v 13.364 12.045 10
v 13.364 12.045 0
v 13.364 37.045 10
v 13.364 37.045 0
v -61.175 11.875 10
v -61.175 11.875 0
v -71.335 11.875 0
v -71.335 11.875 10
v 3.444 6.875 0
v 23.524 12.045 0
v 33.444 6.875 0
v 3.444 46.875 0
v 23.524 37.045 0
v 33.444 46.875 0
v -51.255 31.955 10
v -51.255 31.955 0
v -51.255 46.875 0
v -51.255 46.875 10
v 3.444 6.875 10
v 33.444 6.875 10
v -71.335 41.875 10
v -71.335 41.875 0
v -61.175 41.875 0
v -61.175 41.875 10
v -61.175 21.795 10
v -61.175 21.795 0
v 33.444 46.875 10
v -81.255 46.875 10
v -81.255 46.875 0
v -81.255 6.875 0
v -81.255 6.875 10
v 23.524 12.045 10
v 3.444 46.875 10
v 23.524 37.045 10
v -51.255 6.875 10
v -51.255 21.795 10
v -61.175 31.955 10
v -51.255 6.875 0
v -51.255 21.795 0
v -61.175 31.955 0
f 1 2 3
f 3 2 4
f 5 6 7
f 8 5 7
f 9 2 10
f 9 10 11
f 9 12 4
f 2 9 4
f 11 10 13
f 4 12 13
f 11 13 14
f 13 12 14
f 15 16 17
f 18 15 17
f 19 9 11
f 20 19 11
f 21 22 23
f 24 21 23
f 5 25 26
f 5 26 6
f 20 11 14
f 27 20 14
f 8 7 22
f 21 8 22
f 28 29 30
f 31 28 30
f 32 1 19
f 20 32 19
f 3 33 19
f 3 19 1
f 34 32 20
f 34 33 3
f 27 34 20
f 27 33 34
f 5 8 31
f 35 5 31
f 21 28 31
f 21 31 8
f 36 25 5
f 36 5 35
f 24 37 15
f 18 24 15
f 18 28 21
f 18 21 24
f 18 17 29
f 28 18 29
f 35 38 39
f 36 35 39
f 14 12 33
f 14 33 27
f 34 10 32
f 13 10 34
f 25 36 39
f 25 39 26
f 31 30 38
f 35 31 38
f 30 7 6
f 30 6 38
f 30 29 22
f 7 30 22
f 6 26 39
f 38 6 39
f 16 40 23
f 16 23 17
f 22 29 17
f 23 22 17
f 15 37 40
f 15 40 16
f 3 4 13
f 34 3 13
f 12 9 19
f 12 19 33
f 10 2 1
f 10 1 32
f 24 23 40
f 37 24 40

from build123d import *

# Parameters (mm, degrees)
F0_W     = 30
F0_H     = 40
F0_W_2   = 10.16
F0_H_2   = 25
F1_DEPTH = 10


with BuildPart() as f1:
    # F0 (on Top) → F1 (new body)
    with BuildSketch(Plane.XY):
        Polygon((-51.254819, 31.954766), (-51.254819, 46.874766), (-81.254819, 46.874766), (-81.254819, 6.874766), (-51.254819, 6.874766), (-51.254819, 21.794766), (-61.174819, 21.794766), (-61.174819, 11.874766), (-71.334819, 11.874766), (-71.334819, 41.874766), (-61.174819, 41.874766), (-61.174819, 31.954766), align=None)
        with Locations((18.444153, 26.874766)):
            Rectangle(F0_W, F0_H)
        with Locations((18.444153, 24.544766)):
            Rectangle(F0_W_2, F0_H_2, mode=Mode.SUBTRACT)
    extrude(amount=F1_DEPTH)


solid = f1.part
